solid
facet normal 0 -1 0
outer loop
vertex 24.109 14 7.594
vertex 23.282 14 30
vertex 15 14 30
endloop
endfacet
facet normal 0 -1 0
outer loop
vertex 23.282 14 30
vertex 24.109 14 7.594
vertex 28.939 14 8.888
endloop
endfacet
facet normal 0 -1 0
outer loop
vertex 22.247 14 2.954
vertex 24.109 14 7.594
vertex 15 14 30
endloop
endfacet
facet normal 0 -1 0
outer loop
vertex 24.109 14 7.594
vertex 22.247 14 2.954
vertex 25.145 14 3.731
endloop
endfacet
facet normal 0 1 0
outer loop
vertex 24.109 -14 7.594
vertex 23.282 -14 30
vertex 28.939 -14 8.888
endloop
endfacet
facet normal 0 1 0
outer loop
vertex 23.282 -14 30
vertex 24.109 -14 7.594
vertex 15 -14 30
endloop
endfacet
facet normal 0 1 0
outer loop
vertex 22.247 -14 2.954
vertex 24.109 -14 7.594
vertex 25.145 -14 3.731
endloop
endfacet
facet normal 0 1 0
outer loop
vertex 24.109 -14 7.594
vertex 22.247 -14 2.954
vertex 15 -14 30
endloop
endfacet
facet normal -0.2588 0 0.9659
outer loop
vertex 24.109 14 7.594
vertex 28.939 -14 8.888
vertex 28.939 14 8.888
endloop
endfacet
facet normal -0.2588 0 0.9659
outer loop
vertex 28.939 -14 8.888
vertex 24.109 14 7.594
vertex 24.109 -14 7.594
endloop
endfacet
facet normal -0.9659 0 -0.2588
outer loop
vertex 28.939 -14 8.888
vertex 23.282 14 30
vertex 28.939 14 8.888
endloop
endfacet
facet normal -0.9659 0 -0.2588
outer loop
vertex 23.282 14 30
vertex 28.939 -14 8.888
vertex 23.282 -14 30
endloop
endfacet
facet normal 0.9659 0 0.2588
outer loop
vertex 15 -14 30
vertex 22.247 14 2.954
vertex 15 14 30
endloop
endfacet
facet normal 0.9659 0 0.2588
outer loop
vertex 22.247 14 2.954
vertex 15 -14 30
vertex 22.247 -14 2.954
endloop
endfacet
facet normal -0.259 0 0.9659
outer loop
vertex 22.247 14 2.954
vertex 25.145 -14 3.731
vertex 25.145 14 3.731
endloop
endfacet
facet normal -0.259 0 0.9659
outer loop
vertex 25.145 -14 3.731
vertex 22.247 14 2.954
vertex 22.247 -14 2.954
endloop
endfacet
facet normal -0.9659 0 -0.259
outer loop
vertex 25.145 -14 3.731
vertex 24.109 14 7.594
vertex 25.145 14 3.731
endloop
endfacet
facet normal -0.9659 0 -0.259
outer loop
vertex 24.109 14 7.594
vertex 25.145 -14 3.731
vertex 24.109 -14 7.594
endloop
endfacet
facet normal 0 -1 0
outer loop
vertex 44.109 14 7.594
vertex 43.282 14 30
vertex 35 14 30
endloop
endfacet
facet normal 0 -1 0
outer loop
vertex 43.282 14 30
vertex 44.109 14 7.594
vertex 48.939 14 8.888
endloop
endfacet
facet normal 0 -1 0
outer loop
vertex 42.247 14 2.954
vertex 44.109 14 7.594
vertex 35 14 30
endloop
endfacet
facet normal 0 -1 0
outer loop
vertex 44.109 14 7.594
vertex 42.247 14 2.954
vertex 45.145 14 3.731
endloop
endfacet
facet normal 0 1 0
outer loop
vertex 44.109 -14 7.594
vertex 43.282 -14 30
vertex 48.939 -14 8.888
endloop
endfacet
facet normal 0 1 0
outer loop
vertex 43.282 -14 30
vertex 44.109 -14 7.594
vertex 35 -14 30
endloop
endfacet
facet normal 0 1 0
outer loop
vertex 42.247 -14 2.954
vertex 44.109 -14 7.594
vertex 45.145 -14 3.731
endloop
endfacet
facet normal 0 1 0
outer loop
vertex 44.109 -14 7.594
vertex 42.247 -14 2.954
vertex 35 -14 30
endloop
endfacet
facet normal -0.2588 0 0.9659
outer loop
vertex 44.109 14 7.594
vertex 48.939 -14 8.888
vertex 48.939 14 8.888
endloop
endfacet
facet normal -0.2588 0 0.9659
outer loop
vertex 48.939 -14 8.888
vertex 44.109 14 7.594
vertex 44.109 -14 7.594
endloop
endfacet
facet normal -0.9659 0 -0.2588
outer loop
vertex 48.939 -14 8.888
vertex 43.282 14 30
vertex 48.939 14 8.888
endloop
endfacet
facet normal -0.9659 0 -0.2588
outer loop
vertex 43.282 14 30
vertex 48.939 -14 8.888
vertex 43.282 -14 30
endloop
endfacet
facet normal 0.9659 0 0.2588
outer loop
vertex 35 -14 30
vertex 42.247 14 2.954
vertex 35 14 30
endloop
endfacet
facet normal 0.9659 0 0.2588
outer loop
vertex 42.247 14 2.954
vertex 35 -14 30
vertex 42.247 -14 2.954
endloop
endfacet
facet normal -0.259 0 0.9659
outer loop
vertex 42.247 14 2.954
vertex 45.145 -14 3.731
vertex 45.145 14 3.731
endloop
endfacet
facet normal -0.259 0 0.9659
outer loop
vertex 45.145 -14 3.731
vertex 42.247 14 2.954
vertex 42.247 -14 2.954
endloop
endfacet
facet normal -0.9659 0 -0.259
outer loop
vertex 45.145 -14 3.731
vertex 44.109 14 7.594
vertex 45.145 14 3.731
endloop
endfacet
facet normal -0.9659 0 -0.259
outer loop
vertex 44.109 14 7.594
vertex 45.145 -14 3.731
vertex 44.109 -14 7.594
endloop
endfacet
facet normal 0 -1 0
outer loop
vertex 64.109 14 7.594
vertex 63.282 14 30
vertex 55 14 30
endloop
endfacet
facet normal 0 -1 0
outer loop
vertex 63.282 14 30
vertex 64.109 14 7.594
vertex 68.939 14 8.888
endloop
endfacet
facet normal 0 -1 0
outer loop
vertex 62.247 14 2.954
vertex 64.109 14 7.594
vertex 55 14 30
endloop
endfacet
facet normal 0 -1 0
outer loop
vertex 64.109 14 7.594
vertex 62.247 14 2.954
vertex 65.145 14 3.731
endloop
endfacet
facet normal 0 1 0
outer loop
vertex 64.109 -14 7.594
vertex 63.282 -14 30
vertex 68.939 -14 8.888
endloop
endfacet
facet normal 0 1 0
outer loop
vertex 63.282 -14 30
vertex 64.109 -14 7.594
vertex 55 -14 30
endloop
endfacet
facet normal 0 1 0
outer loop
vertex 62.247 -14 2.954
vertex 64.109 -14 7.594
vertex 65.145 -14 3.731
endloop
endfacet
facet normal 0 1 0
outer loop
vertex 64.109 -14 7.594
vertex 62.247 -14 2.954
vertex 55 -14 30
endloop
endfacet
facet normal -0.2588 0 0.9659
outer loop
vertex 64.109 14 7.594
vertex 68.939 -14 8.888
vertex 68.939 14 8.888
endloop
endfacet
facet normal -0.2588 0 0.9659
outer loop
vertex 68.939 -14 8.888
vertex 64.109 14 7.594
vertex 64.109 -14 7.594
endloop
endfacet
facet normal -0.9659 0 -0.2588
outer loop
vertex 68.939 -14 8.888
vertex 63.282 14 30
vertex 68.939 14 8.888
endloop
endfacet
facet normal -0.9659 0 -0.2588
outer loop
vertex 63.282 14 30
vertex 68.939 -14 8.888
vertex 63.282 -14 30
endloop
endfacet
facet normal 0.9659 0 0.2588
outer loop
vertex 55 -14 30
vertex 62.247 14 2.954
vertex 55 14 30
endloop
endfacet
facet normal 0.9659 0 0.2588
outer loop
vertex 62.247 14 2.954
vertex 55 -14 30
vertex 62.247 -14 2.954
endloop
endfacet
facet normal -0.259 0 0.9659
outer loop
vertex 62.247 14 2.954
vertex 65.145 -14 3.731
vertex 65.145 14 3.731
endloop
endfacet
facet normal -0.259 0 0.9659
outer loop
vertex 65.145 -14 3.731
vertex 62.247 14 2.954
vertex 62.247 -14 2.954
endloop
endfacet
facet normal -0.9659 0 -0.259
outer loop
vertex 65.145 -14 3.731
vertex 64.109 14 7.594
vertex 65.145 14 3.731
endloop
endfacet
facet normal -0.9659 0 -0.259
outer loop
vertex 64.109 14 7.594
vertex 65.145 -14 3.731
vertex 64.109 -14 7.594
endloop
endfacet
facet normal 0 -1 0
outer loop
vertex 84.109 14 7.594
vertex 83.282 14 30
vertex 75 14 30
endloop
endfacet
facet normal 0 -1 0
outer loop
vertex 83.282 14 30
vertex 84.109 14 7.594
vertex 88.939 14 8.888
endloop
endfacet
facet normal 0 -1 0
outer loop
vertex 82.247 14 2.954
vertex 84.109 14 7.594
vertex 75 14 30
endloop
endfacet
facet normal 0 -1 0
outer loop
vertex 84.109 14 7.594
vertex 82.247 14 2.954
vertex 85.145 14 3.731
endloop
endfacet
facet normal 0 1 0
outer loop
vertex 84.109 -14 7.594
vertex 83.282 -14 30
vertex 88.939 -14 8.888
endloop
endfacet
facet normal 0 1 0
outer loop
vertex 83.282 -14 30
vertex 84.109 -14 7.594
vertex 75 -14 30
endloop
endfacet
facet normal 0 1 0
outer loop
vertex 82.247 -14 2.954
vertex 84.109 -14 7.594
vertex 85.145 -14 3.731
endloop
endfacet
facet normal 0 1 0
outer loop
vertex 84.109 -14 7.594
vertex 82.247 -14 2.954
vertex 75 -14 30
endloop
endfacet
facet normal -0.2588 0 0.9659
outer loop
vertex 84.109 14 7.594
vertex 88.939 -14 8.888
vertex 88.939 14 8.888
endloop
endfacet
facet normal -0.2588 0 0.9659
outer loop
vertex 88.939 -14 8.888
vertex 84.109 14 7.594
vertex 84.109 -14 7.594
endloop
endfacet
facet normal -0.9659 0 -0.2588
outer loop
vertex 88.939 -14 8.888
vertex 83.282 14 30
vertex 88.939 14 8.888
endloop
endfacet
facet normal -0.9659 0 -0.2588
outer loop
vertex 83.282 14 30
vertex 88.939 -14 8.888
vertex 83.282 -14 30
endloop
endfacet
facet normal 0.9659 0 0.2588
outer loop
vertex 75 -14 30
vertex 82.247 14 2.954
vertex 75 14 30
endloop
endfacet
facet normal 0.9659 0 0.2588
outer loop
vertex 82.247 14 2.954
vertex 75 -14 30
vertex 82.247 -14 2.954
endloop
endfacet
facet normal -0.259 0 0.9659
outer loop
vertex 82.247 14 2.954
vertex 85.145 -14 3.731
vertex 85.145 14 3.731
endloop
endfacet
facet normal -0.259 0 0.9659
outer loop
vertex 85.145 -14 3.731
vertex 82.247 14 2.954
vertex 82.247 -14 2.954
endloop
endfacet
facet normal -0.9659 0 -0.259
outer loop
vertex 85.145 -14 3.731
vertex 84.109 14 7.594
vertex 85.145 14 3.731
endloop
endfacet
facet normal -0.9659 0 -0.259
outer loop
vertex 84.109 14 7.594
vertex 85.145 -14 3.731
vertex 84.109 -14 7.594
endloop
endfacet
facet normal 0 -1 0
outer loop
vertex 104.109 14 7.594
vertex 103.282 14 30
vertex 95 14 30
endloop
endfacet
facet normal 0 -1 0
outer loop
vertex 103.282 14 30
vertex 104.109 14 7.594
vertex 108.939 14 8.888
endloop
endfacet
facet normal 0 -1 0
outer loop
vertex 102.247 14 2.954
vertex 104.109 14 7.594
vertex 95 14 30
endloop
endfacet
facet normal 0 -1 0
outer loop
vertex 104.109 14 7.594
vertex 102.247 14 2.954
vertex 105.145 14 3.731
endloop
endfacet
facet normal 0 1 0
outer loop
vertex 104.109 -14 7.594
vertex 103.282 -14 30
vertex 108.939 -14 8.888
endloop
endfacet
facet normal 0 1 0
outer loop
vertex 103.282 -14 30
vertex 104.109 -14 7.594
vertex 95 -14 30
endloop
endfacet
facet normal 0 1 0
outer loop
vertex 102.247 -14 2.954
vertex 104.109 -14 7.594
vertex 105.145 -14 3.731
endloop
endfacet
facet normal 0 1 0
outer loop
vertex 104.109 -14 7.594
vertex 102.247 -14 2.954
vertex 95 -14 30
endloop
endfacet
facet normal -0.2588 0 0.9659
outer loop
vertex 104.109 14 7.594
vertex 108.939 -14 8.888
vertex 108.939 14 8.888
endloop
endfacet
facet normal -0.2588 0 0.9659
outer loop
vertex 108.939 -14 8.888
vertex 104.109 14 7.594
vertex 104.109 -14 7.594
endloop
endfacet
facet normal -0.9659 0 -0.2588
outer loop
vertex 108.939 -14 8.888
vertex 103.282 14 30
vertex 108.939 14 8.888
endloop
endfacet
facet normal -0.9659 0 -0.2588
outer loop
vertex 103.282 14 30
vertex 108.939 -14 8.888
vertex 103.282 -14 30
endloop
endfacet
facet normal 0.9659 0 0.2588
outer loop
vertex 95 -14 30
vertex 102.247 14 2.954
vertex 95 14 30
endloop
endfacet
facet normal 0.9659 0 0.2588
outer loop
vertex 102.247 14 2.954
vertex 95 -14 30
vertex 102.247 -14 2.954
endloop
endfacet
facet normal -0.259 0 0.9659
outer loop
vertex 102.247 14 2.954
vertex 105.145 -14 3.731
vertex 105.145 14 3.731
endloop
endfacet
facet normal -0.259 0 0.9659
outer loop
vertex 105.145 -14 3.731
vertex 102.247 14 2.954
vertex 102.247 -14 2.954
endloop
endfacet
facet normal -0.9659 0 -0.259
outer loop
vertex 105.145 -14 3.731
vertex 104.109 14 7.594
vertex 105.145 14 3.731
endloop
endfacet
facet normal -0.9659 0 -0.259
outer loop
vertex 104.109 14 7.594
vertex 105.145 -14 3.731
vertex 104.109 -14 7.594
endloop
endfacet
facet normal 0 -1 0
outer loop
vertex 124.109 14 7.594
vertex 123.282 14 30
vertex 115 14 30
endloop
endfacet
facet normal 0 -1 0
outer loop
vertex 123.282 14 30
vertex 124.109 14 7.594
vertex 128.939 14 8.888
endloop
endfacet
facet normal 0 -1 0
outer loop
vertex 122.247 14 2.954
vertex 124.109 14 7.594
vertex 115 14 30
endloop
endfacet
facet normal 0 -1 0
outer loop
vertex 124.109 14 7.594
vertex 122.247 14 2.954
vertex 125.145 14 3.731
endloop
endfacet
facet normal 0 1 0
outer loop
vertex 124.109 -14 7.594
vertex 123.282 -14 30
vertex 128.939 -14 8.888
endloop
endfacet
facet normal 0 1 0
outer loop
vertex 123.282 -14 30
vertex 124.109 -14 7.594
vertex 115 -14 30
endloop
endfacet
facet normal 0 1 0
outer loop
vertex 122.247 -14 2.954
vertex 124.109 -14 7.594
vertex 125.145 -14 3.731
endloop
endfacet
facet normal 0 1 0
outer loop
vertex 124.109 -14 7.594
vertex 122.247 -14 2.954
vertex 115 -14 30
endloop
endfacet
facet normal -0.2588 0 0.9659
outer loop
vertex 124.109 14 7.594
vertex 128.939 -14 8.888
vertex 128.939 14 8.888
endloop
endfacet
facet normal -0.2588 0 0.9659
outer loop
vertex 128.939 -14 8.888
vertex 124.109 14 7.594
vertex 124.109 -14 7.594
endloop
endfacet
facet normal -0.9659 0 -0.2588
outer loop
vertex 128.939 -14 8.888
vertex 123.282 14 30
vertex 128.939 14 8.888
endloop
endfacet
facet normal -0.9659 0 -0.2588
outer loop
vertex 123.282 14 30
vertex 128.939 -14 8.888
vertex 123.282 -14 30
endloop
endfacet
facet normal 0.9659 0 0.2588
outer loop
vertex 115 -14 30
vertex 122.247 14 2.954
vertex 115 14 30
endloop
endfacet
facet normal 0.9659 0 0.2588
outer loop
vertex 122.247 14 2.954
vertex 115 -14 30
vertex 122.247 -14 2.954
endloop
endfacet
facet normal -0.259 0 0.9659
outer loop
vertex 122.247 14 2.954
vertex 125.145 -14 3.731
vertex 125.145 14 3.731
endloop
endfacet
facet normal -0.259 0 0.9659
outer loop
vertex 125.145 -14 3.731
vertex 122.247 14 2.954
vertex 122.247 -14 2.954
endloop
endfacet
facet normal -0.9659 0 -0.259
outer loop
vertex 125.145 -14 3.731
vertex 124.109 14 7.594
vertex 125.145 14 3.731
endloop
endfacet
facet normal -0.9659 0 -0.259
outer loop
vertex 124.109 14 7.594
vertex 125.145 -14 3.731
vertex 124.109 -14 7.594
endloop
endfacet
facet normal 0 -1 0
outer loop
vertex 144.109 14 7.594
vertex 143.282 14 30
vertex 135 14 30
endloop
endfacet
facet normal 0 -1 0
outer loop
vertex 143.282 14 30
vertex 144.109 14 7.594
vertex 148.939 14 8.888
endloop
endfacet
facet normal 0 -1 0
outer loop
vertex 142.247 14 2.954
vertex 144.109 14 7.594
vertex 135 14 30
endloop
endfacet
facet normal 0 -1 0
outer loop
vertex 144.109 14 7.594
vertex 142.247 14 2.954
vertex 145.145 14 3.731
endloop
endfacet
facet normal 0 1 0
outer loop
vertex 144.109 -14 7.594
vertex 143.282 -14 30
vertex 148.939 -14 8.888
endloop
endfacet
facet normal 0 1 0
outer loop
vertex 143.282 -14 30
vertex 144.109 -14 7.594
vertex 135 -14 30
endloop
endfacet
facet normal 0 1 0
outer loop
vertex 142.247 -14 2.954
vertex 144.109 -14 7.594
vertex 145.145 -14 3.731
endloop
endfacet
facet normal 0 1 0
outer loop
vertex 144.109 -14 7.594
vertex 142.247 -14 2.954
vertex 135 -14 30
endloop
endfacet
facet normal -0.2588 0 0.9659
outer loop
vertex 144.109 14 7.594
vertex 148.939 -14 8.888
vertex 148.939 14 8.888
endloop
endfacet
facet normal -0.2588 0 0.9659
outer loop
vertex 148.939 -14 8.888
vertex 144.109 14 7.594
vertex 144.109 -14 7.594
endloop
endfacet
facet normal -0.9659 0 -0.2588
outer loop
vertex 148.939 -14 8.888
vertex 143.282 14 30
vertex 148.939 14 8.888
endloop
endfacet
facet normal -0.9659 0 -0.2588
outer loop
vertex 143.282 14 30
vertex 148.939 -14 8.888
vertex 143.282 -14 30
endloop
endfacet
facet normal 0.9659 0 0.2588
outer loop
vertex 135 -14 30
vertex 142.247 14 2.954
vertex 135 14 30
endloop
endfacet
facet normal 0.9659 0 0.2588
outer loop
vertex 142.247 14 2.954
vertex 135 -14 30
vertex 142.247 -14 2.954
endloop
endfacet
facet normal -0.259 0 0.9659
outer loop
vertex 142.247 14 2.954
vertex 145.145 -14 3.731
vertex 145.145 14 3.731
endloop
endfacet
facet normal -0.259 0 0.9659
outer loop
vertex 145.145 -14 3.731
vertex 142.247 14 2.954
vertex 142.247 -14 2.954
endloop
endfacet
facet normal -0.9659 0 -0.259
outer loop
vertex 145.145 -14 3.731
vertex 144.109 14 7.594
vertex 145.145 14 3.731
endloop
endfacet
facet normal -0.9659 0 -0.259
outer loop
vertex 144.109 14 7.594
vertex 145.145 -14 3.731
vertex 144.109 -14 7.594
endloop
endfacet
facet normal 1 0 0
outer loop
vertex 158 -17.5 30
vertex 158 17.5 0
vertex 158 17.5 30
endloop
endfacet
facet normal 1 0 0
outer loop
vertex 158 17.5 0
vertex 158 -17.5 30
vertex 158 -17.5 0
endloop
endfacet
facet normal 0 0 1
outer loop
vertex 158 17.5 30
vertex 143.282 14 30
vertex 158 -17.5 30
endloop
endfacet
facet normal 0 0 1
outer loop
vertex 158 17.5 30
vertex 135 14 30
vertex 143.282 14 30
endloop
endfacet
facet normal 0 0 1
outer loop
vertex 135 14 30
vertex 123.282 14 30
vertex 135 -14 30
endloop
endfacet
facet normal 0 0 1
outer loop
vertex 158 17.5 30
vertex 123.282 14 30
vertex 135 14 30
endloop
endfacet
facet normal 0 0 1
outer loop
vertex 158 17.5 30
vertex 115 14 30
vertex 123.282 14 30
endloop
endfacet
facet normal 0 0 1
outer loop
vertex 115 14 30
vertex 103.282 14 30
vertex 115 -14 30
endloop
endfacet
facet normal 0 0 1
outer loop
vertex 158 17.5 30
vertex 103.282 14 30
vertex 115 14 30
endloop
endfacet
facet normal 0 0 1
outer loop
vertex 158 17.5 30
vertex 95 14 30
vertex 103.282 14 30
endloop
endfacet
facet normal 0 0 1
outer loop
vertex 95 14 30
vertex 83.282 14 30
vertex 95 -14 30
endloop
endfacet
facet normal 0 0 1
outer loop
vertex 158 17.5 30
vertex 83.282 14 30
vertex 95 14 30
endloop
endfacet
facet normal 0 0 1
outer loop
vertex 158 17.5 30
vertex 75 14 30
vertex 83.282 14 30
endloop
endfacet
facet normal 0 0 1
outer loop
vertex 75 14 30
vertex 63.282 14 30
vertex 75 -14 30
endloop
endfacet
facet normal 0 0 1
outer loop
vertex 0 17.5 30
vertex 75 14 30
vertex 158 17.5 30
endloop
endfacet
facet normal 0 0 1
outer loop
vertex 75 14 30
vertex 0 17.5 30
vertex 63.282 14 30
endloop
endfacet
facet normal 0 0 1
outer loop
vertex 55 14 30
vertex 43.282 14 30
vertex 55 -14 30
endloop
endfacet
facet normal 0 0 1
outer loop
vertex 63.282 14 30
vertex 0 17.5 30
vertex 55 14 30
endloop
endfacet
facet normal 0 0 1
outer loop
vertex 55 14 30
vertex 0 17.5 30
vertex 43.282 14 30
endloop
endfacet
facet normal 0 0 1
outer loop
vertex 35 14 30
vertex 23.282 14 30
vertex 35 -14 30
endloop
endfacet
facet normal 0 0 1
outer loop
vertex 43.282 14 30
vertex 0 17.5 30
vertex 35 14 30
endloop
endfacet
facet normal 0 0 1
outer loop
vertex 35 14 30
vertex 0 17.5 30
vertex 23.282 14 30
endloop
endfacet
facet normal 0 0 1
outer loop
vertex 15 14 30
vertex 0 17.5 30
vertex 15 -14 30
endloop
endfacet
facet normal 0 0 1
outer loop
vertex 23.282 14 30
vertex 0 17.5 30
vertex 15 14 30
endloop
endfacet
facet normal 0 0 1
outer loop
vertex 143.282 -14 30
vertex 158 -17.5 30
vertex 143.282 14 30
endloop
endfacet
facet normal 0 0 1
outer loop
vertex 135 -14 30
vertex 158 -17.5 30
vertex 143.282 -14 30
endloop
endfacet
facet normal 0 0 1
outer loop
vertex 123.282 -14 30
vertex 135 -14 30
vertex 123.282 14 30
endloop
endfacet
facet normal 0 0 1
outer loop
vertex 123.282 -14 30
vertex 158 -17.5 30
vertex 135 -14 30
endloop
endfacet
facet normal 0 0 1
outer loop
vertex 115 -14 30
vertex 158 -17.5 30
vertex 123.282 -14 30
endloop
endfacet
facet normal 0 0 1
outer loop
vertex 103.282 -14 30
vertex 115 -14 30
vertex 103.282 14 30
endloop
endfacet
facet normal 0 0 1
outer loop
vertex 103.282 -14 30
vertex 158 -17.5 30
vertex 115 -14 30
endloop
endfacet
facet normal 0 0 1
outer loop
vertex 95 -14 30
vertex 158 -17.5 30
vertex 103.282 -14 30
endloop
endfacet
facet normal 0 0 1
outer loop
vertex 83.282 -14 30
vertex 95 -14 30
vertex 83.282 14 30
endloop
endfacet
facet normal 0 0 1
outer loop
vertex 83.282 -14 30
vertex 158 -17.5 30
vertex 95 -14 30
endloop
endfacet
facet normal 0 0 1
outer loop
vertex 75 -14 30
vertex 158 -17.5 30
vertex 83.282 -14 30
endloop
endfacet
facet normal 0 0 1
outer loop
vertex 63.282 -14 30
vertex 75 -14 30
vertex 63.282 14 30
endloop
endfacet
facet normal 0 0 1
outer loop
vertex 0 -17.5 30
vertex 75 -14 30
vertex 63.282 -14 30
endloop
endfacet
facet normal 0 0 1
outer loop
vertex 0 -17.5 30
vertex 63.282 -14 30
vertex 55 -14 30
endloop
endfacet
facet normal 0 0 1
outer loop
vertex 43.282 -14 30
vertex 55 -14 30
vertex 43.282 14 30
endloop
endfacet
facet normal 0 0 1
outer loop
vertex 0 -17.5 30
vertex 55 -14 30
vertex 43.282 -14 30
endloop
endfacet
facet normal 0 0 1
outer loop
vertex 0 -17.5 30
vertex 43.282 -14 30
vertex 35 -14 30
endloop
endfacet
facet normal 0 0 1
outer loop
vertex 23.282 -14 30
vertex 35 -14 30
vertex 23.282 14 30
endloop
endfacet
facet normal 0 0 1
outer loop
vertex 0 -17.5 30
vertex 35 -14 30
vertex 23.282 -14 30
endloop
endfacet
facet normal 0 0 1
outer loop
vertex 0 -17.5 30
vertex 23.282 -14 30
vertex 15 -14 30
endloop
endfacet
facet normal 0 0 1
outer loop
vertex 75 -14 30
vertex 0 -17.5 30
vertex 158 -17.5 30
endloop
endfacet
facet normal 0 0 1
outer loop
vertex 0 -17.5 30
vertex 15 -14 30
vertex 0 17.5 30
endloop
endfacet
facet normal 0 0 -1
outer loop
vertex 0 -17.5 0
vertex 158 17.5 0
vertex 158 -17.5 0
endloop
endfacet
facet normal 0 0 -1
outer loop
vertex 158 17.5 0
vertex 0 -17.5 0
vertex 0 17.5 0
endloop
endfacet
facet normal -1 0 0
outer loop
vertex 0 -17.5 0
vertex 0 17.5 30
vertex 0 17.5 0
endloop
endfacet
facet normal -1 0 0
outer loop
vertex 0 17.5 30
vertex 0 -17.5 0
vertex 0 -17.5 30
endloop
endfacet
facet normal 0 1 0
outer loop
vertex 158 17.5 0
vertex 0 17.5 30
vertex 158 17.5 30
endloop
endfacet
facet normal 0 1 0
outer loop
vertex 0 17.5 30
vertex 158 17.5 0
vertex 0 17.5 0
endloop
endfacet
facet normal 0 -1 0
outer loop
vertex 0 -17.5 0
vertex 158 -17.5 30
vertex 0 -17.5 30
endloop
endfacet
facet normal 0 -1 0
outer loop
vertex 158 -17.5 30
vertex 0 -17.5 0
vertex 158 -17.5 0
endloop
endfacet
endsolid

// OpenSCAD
// Holder for Edge Pro sharpening stones.
// Intended for 3D printing.


// Parameters.
box_width  = 35;
box_height = 30;

first_slot_pos = 15;
slot_spacing   = 20;
num_slots      = 7;

slot_depth = 28;
slot_angle = -15.0;

// Define the cutout for a single stone.
// Using a module so that I can re-use it.
module slot(depth=10, width=28, angle=0.0) {
    rotate([90, -15, 0])
    linear_extrude(height=width, twist=0, center=true, scale=1.0, slices=1, convexity=1) 
    polygon(points=[ [0, 0 - depth],
                     [3, 0 - depth],
                     [3, 4 - depth],
                     [8, 4 - depth],
                     [8, 0],
                     [0, 0] ]);    
};

// Construction.
difference() {
    // The box.
    translate([0, -box_width/2, 0])
    color([0.5, 0.5, 0.5])
    cube(size=[2 * first_slot_pos + (num_slots - 1) * slot_spacing + 8, box_width, box_height] ) ;
    
    // Make slots.
    for(i = [0 : num_slots - 1]) {
        translate([first_slot_pos + i * slot_spacing, 0, box_height])
        color([1, 0, 0])
        slot(depth=slot_depth, angle=slot_angle);
    };
};
